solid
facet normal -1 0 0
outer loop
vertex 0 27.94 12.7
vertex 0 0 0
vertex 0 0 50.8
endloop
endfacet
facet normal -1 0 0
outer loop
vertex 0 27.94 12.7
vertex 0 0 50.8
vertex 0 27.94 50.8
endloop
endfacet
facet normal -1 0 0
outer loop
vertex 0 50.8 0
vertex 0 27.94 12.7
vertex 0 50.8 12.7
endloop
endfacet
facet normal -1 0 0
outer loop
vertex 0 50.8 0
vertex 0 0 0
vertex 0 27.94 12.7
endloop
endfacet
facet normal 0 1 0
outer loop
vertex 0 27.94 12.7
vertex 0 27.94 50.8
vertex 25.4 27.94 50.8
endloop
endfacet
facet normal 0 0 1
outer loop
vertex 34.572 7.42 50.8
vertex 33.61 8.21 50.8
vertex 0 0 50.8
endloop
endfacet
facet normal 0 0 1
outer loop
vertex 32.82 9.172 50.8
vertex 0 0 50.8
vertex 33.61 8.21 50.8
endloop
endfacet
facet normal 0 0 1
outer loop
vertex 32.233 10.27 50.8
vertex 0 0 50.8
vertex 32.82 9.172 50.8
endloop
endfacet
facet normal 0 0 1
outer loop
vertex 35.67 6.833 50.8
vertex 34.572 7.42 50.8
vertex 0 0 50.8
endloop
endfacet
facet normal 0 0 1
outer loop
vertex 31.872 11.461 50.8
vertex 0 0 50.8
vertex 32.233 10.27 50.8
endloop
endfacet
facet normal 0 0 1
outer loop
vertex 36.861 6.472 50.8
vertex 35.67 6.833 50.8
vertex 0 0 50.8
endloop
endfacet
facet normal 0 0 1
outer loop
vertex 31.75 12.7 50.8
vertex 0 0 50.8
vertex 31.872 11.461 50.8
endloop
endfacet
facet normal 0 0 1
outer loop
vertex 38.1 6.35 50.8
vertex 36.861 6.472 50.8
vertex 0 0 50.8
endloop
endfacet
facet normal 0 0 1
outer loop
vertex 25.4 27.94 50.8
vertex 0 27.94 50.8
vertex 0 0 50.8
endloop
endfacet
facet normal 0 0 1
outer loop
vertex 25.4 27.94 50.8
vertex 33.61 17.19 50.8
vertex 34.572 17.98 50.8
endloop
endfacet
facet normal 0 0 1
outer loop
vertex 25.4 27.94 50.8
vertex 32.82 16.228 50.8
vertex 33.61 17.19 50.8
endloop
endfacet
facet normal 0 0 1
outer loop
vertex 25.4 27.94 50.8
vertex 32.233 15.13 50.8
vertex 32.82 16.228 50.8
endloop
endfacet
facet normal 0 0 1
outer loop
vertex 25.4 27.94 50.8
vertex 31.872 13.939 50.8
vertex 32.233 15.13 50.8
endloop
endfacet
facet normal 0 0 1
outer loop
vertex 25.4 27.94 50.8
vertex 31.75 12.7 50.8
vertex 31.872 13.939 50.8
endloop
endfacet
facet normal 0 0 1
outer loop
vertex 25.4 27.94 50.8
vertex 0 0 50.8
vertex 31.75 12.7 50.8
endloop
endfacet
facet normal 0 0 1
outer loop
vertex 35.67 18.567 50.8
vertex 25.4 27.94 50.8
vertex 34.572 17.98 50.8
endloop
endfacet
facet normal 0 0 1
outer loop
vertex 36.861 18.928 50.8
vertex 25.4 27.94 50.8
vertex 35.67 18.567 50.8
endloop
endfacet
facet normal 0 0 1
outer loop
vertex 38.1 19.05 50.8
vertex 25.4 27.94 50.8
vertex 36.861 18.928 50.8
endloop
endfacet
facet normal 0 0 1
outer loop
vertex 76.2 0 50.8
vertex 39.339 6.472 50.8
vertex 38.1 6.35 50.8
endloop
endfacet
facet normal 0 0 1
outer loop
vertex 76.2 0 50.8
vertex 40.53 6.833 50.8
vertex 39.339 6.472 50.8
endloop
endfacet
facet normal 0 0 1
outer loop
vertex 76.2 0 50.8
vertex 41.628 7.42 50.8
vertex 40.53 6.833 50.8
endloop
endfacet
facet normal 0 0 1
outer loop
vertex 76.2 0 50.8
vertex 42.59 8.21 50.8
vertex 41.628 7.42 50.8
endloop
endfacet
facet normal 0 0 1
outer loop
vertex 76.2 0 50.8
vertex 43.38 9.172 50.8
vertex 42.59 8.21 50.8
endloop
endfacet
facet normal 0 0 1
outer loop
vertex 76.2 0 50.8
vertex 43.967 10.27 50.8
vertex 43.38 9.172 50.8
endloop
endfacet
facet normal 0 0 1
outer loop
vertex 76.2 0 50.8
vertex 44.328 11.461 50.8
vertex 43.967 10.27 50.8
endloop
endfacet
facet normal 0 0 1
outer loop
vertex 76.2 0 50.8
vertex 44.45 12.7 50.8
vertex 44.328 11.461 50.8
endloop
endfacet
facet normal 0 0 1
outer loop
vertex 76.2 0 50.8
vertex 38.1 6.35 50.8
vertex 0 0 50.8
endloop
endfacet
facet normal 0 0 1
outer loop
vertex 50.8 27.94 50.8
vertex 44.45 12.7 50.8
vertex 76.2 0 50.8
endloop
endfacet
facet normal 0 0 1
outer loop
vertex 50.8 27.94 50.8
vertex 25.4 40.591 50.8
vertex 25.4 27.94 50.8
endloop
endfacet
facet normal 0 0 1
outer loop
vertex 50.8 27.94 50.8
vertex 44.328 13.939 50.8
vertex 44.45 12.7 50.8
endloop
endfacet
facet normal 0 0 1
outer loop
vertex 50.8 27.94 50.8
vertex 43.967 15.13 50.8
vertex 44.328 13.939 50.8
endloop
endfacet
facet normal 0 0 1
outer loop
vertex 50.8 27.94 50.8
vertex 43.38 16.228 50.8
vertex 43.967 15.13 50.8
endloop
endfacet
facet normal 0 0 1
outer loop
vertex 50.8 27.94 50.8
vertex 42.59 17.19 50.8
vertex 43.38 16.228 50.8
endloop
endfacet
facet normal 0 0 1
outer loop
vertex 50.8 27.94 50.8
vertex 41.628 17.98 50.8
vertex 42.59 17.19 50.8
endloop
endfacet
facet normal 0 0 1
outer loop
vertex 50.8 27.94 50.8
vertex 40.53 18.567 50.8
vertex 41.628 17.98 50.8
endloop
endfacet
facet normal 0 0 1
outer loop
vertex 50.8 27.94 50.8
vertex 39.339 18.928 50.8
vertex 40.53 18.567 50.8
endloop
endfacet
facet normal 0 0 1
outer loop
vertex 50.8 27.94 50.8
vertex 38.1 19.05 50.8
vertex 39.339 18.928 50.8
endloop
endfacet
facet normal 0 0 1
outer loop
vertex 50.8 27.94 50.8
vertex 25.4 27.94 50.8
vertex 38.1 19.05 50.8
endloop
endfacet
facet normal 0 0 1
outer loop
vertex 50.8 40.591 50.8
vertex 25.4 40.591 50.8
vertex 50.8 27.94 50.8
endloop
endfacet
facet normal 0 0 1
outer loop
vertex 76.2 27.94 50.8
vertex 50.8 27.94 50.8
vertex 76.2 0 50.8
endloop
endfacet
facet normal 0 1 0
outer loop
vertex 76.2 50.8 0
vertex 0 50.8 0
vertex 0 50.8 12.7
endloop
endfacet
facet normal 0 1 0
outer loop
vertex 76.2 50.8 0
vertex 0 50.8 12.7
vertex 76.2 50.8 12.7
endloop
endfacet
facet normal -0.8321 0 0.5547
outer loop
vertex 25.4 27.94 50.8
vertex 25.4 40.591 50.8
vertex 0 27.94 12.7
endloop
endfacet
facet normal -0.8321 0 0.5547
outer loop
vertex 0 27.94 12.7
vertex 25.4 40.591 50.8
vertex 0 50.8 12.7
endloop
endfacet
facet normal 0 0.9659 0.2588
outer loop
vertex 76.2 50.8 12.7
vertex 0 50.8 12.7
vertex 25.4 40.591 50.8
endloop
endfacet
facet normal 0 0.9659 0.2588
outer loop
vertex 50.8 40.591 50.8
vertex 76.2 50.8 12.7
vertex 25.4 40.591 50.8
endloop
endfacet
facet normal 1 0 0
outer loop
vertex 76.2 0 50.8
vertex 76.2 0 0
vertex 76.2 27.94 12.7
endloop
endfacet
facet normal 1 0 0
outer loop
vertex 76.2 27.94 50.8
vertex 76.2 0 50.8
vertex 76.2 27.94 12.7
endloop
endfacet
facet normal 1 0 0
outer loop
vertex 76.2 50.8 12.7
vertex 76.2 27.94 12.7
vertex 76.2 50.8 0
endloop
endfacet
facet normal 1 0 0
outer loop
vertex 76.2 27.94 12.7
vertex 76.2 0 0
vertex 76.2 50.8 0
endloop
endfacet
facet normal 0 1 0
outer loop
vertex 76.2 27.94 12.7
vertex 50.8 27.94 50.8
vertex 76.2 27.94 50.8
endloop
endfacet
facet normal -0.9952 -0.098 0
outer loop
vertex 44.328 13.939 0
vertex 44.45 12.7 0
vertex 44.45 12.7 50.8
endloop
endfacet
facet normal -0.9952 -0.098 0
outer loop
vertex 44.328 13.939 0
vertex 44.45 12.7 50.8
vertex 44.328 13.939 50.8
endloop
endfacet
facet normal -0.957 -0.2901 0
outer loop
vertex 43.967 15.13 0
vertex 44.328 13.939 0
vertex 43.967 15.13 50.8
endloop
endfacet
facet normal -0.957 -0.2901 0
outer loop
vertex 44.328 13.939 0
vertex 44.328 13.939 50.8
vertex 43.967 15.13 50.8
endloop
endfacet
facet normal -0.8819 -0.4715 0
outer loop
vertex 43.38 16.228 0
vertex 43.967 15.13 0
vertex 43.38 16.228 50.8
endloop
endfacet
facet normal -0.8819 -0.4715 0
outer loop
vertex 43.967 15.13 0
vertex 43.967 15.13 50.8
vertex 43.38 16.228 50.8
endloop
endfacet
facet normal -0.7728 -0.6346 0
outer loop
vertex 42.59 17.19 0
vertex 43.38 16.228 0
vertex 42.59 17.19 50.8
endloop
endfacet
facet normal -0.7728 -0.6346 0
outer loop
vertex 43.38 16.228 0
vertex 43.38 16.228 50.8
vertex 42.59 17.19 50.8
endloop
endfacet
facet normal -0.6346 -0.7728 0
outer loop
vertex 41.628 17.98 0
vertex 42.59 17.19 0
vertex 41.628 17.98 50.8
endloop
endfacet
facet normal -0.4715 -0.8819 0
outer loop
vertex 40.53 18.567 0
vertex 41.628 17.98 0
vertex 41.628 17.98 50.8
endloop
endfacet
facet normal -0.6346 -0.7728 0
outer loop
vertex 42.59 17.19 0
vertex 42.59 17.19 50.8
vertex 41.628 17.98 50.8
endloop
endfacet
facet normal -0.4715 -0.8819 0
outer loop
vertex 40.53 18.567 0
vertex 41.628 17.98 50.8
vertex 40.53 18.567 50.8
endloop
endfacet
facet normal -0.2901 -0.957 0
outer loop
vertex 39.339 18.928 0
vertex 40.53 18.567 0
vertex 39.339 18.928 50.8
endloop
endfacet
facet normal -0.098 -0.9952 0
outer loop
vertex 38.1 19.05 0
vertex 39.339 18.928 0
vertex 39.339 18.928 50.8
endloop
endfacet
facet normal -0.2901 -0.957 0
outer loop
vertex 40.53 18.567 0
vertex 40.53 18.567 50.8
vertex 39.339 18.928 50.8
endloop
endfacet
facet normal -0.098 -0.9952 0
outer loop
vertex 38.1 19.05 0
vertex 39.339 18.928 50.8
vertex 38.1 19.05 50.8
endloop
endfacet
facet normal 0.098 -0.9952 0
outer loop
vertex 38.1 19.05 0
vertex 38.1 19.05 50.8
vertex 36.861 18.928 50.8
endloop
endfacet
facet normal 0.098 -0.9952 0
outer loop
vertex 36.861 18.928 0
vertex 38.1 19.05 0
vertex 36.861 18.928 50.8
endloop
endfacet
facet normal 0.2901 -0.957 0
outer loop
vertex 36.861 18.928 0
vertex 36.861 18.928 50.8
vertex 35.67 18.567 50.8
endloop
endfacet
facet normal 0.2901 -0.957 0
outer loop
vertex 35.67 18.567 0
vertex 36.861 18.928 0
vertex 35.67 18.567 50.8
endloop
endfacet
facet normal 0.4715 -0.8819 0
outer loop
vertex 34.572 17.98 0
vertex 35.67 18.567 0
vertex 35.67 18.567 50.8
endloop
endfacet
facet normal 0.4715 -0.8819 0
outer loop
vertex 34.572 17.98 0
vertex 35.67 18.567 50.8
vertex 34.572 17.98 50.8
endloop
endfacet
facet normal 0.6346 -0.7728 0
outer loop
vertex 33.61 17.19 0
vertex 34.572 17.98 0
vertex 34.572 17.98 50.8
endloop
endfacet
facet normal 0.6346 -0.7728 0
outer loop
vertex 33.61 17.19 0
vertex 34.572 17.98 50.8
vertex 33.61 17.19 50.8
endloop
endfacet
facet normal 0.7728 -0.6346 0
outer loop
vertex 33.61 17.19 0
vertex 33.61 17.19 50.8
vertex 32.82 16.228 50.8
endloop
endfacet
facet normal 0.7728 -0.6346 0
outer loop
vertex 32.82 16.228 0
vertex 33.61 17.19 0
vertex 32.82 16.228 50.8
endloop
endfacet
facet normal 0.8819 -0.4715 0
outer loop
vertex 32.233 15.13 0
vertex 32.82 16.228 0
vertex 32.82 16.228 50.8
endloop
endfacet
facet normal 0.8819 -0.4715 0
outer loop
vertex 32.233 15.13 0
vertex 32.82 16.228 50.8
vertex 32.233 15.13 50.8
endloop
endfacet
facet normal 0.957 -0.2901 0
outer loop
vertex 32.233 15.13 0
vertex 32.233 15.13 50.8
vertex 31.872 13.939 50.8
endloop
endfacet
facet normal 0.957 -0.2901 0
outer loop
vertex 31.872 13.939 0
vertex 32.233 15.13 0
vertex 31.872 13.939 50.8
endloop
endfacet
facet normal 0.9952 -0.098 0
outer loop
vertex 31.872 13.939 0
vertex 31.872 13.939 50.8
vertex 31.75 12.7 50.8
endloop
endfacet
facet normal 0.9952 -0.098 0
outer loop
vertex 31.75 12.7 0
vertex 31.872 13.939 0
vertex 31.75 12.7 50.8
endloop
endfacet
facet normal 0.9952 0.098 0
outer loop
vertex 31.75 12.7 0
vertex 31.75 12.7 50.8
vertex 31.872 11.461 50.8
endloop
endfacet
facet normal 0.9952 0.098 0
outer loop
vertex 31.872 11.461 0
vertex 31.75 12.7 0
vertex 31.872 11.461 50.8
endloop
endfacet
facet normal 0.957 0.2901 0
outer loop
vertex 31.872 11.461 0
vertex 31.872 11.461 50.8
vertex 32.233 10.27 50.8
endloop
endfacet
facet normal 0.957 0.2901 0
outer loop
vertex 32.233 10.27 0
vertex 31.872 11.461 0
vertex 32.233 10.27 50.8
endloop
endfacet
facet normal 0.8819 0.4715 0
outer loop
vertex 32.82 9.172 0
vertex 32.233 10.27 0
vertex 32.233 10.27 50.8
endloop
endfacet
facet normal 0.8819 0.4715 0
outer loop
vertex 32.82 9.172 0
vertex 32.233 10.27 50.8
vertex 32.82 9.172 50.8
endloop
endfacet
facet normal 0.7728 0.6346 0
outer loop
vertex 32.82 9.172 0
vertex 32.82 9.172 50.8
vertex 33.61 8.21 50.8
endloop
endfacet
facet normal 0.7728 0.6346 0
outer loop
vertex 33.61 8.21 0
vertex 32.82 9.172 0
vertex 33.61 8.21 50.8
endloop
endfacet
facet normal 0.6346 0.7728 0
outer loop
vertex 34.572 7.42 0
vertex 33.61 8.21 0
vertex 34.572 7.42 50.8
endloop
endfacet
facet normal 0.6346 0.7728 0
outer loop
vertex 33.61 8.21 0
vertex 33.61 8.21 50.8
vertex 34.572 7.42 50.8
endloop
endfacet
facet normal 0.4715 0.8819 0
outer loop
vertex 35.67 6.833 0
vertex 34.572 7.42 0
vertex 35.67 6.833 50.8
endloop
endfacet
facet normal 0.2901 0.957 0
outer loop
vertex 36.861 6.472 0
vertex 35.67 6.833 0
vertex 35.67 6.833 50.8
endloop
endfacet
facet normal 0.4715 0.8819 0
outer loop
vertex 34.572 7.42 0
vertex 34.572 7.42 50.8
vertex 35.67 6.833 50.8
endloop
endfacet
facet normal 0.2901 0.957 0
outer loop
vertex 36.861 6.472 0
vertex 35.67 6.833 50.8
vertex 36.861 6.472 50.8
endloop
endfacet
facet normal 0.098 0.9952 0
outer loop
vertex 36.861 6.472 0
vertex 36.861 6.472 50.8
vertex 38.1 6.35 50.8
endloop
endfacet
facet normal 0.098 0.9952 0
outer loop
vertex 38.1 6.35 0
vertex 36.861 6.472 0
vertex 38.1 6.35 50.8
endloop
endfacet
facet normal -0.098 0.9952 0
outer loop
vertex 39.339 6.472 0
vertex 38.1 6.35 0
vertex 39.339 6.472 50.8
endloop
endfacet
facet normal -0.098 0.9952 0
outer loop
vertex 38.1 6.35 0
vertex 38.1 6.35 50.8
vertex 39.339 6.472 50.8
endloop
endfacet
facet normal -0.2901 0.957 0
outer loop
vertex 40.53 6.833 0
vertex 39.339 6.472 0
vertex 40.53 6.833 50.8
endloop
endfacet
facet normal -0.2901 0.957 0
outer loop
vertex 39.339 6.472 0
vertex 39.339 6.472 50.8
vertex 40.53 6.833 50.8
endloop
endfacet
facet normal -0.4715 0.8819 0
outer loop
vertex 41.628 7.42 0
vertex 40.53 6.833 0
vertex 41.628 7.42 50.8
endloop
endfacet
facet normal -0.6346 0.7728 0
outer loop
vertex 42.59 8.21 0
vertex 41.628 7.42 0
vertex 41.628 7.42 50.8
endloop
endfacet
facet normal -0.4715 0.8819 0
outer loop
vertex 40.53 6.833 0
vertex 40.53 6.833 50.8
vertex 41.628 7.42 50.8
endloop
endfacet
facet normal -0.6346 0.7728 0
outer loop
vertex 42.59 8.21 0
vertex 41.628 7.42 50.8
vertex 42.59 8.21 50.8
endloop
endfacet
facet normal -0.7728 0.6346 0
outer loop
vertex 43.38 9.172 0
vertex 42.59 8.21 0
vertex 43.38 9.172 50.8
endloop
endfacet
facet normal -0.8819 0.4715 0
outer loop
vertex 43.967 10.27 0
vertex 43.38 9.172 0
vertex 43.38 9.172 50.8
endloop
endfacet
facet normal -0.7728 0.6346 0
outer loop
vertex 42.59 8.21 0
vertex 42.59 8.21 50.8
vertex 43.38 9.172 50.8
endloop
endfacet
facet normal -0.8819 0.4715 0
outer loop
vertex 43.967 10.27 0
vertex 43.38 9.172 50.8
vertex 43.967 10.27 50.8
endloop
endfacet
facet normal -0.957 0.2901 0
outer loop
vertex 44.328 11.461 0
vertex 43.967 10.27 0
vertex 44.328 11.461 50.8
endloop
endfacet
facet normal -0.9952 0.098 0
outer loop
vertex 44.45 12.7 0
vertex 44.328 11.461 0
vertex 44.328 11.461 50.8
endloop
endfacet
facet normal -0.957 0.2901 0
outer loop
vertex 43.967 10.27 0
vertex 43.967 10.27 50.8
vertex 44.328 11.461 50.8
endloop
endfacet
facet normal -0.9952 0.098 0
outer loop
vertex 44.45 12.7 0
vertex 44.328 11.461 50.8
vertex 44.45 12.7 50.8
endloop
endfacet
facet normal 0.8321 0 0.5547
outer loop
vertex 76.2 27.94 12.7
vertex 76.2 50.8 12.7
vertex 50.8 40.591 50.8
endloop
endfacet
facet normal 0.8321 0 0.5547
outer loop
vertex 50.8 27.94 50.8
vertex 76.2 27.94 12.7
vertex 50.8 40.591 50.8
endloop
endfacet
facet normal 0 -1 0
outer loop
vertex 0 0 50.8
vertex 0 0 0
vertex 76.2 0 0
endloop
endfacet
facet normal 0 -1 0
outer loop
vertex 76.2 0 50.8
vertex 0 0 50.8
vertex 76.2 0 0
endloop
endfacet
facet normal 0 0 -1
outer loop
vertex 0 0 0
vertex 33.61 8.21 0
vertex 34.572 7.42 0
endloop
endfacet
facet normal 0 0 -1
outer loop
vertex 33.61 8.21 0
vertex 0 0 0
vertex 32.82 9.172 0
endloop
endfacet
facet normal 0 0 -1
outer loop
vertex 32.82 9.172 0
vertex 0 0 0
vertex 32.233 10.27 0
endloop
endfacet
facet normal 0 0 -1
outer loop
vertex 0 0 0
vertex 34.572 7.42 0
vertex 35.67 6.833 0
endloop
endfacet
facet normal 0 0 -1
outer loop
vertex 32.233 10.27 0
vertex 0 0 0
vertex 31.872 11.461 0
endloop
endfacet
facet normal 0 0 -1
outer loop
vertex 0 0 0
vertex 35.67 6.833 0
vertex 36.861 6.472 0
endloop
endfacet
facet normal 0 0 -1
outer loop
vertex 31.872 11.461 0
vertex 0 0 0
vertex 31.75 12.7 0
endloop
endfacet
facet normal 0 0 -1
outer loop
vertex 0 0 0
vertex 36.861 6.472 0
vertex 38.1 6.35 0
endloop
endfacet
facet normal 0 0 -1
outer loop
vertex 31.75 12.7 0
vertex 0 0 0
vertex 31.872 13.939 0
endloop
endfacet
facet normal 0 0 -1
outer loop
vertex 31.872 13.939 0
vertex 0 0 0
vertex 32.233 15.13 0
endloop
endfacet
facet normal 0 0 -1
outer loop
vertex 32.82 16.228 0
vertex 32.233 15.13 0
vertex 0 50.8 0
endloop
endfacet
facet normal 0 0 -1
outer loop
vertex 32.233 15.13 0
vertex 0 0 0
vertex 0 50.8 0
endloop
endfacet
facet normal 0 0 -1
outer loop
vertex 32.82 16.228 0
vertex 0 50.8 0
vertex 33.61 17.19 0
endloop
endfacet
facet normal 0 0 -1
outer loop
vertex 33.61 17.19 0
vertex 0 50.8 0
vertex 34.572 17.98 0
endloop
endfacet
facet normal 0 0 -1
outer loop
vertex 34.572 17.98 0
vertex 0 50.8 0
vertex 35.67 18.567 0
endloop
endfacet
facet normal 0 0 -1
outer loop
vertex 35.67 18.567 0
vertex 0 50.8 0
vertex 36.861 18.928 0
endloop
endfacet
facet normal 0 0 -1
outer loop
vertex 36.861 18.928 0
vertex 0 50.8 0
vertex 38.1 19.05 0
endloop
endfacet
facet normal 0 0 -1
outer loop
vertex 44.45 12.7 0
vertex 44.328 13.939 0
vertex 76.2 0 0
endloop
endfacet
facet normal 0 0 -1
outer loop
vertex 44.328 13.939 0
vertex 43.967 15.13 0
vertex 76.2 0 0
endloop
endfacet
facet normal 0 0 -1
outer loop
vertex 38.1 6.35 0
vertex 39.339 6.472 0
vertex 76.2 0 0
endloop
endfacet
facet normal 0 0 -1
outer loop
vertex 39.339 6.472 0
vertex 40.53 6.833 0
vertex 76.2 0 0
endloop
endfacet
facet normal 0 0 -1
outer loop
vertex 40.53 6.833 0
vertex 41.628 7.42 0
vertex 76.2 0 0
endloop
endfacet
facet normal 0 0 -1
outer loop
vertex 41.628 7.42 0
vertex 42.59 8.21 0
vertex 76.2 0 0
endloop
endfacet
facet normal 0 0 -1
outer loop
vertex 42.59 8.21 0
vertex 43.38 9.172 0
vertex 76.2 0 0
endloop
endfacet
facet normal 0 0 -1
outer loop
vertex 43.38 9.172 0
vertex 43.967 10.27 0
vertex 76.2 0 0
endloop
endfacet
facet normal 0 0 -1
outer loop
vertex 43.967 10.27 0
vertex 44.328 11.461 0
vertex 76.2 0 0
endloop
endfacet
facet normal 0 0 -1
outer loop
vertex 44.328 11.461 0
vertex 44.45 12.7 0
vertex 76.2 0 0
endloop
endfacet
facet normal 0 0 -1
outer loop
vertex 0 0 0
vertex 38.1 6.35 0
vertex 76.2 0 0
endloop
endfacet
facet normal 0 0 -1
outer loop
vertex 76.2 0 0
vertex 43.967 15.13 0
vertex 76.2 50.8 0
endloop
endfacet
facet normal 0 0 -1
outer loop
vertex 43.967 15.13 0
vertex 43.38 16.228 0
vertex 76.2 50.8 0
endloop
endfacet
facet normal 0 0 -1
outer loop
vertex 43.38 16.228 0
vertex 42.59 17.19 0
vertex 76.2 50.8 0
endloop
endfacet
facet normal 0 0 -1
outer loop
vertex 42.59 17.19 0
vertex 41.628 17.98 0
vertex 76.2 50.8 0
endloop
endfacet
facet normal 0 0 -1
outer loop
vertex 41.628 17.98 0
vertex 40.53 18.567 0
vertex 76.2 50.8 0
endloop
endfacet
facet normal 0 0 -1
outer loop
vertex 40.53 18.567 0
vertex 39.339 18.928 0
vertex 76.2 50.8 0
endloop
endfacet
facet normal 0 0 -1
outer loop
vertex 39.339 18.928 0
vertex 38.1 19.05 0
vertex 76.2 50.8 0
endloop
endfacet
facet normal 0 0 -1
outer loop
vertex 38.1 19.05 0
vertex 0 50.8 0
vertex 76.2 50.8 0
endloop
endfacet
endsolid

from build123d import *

# Parameters (mm, degrees)
SKETCH1_W               = 76.2
SKETCH1_H               = 50.8
BOSS_EXTRUDE1_DEPTH     = 50.8
CUT_EXTRUDE1_DEPTH      = 1
CUT_EXTRUDE1_DEPTH_BACK = 22.86
CUT_EXTRUDE2_DEPTH      = 77.2
SKETCH6_R               = 6.35
CUT_EXTRUDE3_DEPTH      = 51.8


with BuildPart() as part:
    # Sketch1 → Boss-Extrude1 (new body)
    with BuildSketch(Plane.XY):
        with Locations((38.1, 25.4)):
            Rectangle(SKETCH1_W, SKETCH1_H)
    extrude(amount=BOSS_EXTRUDE1_DEPTH)

    # Sketch2 → Cut-Extrude1 (cut, two sides)
    with BuildSketch(Plane(origin=(0, 50.8, 0), x_dir=(1, 0, 0), z_dir=(0, 1, 0))) as cut_extrude1_sk:
        Polygon((76.2, -12.7), (50.8, -50.8), (76.2, -50.8), align=None)
        Polygon((0, -12.7), (0, -50.8), (25.4, -50.8), align=None)
    extrude(amount=CUT_EXTRUDE1_DEPTH, mode=Mode.SUBTRACT)
    extrude(cut_extrude1_sk.sketch, amount=-CUT_EXTRUDE1_DEPTH_BACK, mode=Mode.SUBTRACT)

    # Sketch3 → Cut-Extrude2 (cut, through all)
    with BuildSketch(Plane(origin=(76.2, 0, 0), x_dir=(0, 0, -1), z_dir=(1, 0, 0))):
        Polygon((-12.7, 50.8), (-50.8, 40.591135768), (-50.8, 50.8), align=None)
    extrude(amount=-CUT_EXTRUDE2_DEPTH, mode=Mode.SUBTRACT)

    # Sketch6 → Cut-Extrude3 (cut, through all)
    with BuildSketch(Plane.XY.offset(50.8)):
        with Locations((38.1, 12.7)):
            Circle(SKETCH6_R)
    extrude(amount=-CUT_EXTRUDE3_DEPTH, mode=Mode.SUBTRACT)


solid = part.part
